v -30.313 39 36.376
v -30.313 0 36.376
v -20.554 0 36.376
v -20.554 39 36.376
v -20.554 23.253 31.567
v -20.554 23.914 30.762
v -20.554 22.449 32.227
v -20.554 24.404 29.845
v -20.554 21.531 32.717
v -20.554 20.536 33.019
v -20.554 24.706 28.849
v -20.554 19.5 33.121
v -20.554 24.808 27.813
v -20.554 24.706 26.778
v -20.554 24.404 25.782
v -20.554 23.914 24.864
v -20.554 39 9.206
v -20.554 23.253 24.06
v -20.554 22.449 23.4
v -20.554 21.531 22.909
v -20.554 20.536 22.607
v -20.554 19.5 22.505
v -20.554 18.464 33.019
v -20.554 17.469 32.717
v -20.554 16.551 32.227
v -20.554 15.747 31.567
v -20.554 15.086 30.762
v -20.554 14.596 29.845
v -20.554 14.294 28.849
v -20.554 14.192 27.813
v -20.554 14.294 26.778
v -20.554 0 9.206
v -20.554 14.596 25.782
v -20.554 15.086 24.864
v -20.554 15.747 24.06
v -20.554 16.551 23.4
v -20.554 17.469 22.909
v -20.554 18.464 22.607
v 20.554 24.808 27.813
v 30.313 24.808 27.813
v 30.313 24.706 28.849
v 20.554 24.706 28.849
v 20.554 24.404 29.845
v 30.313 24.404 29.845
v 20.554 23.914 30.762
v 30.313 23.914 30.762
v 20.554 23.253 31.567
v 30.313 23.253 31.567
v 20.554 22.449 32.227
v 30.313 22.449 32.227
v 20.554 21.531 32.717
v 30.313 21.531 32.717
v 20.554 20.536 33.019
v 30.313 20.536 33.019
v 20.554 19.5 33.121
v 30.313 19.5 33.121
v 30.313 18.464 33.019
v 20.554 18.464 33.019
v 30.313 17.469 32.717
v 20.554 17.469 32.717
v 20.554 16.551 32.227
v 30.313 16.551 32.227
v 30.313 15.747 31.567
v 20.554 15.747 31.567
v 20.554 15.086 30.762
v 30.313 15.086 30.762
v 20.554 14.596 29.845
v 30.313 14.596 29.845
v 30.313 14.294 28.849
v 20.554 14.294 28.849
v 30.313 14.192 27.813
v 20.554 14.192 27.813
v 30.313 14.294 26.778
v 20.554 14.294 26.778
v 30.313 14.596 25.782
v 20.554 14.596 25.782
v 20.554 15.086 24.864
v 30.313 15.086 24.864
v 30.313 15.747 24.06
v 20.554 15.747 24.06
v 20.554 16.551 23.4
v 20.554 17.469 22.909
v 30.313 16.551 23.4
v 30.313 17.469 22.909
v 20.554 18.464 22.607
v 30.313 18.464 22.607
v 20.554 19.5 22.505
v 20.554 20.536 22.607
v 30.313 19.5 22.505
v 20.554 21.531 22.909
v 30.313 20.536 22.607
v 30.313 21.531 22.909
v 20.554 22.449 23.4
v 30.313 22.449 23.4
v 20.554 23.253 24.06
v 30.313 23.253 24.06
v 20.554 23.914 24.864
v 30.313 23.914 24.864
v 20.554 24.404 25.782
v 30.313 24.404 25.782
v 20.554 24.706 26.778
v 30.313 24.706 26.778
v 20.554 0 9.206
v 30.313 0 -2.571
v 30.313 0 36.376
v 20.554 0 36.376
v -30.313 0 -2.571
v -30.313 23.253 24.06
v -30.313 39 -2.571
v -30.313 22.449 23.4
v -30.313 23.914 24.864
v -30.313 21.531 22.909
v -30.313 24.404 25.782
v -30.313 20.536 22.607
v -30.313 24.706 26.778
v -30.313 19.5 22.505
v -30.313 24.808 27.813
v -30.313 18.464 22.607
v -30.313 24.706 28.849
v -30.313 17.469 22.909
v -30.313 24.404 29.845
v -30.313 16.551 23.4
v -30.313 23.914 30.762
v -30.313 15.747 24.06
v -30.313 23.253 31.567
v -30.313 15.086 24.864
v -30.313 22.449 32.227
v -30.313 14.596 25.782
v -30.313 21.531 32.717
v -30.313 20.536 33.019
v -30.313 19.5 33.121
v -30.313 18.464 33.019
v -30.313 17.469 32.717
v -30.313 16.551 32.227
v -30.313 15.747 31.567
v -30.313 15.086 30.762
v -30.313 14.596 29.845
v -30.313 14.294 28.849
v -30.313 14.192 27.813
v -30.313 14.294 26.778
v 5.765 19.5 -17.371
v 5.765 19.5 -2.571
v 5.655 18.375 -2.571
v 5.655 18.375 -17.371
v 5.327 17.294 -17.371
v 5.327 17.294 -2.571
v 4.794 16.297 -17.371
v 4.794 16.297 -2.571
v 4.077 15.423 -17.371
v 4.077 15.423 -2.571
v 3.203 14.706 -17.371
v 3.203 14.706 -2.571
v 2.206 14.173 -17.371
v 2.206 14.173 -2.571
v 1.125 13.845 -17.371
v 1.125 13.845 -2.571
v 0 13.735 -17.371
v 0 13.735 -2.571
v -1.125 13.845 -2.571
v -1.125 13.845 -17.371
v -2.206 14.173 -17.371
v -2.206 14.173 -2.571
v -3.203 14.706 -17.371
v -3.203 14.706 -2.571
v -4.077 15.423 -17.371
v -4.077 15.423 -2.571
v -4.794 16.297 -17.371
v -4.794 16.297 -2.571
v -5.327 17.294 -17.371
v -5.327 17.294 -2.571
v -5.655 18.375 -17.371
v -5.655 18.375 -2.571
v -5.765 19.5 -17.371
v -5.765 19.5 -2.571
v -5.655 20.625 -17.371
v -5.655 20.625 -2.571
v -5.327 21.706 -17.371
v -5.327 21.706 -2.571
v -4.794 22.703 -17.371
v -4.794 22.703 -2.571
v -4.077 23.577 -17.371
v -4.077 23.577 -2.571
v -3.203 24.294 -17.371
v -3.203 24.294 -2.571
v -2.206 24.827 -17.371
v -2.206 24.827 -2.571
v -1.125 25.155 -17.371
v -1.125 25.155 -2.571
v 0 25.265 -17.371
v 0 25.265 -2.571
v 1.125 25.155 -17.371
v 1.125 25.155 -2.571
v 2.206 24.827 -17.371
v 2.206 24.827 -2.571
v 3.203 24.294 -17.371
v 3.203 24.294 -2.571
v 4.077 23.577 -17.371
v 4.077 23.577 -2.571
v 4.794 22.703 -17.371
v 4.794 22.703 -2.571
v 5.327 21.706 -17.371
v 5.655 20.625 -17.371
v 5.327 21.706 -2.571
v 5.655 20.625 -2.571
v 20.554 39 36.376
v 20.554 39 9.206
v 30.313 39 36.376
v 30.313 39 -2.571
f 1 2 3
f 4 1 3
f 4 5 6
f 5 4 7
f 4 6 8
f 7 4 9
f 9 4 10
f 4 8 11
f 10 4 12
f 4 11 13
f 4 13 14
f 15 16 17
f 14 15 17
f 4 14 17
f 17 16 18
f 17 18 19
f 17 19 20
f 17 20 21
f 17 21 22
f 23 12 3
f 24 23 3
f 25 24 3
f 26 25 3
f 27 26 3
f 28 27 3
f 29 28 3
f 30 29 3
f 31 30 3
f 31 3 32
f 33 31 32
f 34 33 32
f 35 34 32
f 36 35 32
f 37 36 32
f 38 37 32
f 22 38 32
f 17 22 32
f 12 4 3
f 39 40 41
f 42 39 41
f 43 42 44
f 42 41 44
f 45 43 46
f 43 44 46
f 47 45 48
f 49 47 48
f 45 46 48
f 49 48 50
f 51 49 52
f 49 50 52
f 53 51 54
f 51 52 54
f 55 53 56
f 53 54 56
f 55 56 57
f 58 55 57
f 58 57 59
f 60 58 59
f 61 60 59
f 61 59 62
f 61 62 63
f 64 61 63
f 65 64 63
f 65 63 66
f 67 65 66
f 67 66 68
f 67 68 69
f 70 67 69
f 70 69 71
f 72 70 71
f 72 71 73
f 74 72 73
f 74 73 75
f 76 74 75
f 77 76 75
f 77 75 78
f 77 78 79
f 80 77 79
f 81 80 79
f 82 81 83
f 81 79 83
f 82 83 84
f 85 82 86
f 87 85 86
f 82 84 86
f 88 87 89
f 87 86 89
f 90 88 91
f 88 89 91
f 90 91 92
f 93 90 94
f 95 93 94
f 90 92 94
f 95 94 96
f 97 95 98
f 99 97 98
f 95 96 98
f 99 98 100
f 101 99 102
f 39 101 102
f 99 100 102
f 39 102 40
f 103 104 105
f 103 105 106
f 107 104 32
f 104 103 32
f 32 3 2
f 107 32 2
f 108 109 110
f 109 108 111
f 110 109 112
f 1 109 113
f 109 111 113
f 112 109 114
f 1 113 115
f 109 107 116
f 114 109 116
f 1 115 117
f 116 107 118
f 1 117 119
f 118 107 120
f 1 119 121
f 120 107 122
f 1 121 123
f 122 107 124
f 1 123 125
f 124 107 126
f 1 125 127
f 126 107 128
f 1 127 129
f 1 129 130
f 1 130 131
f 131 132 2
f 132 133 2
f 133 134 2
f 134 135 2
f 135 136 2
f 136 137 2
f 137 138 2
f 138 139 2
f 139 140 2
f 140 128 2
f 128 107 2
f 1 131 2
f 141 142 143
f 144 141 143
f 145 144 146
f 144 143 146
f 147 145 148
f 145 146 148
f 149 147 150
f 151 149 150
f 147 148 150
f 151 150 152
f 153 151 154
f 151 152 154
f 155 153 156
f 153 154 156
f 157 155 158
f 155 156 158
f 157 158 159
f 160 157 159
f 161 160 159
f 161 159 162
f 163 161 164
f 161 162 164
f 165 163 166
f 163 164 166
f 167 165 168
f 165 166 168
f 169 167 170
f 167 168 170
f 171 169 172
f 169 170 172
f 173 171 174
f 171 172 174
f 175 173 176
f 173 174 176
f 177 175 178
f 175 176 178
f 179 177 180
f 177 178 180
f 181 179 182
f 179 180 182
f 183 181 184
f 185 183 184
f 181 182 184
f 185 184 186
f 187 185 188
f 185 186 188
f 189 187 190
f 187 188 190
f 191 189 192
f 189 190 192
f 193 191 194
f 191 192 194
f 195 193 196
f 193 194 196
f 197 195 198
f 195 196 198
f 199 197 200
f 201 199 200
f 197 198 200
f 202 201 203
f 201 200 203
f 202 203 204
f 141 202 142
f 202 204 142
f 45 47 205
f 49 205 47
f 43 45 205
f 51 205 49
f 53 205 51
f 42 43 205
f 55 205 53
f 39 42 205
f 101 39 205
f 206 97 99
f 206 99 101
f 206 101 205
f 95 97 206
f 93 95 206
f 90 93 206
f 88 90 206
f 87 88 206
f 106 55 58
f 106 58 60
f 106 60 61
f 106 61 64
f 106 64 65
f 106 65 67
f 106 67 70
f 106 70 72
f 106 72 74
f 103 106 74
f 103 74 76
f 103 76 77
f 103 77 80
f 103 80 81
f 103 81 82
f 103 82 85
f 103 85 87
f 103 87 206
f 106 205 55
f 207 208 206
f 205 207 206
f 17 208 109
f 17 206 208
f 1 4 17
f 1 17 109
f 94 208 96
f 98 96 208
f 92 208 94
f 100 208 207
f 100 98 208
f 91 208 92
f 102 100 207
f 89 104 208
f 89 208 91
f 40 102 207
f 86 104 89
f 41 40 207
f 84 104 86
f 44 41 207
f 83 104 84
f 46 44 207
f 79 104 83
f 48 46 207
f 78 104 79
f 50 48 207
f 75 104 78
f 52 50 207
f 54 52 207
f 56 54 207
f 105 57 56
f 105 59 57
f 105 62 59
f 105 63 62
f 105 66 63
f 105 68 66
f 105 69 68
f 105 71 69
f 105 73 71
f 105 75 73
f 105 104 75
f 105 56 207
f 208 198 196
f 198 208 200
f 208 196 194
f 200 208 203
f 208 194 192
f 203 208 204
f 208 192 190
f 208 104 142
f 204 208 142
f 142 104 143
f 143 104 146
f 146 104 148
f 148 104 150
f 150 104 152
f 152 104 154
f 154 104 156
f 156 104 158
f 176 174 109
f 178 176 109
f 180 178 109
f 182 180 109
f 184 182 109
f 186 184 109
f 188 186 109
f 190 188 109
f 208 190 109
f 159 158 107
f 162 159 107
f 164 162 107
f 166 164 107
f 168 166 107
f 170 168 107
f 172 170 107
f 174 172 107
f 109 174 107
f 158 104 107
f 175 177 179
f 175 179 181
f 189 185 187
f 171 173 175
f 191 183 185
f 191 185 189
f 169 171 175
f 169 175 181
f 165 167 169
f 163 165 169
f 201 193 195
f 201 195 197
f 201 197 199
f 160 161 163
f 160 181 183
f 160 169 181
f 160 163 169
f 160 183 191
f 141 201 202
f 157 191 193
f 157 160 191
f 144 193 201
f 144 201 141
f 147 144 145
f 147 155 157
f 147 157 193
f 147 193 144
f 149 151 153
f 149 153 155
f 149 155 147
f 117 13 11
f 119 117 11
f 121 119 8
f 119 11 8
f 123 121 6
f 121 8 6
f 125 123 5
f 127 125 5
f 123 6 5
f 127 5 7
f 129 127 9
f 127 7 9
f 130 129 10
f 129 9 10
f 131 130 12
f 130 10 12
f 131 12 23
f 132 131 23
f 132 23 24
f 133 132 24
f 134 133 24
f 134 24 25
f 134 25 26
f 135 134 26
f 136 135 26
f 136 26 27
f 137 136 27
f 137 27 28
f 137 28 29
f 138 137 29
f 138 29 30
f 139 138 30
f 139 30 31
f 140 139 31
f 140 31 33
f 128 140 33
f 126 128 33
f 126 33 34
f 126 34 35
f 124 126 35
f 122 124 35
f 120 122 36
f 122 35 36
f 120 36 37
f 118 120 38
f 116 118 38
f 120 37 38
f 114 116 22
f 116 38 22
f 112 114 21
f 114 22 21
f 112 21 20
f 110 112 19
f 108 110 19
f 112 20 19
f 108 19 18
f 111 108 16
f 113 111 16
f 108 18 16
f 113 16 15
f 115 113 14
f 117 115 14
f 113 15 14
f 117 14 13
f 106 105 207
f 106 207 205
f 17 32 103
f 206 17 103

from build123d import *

# Parameters (mm, degrees)
F1_DEPTH = 39
F3_R     = 5.308104
F4_DEPTH = 60.626907
F5_R     = 5.76541
F6_DEPTH = 14.8


with BuildPart() as f1:
    # F0 (on Front) → F1 (new body)
    with BuildSketch(Plane.XZ):
        Polygon((0, 9.205531), (0, -2.570523), (30.312954, -2.570523), (30.312954, 36.376152), (20.553786, 36.376152), (20.553786, 9.205531), align=None)
    extrude(amount=-F1_DEPTH)

    # F2: F1 across face


with BuildPart() as f1_1:
    add(f1.part)
    add(f1.part.mirror(Plane(origin=(0, 19.5, 3.317504), x_dir=(0, -1, 0), z_dir=(-1, 0, 0))))

    # F3 (on face) → F4 (cut, through all)
    with BuildSketch(Plane.YZ.offset(30.312954)):
        with Locations((19.5, 27.813217)):
            Circle(F3_R)
    extrude(amount=-F4_DEPTH, mode=Mode.SUBTRACT)

    # F5 (on face) → F6 (join)
    with BuildSketch(Plane(origin=(0, 0, -2.570523), x_dir=(1, 0, 0), z_dir=(0, 0, -1))):
        with Locations((0, -19.5)):
            Circle(F5_R)
    extrude(amount=F6_DEPTH)


solid = f1_1.part
